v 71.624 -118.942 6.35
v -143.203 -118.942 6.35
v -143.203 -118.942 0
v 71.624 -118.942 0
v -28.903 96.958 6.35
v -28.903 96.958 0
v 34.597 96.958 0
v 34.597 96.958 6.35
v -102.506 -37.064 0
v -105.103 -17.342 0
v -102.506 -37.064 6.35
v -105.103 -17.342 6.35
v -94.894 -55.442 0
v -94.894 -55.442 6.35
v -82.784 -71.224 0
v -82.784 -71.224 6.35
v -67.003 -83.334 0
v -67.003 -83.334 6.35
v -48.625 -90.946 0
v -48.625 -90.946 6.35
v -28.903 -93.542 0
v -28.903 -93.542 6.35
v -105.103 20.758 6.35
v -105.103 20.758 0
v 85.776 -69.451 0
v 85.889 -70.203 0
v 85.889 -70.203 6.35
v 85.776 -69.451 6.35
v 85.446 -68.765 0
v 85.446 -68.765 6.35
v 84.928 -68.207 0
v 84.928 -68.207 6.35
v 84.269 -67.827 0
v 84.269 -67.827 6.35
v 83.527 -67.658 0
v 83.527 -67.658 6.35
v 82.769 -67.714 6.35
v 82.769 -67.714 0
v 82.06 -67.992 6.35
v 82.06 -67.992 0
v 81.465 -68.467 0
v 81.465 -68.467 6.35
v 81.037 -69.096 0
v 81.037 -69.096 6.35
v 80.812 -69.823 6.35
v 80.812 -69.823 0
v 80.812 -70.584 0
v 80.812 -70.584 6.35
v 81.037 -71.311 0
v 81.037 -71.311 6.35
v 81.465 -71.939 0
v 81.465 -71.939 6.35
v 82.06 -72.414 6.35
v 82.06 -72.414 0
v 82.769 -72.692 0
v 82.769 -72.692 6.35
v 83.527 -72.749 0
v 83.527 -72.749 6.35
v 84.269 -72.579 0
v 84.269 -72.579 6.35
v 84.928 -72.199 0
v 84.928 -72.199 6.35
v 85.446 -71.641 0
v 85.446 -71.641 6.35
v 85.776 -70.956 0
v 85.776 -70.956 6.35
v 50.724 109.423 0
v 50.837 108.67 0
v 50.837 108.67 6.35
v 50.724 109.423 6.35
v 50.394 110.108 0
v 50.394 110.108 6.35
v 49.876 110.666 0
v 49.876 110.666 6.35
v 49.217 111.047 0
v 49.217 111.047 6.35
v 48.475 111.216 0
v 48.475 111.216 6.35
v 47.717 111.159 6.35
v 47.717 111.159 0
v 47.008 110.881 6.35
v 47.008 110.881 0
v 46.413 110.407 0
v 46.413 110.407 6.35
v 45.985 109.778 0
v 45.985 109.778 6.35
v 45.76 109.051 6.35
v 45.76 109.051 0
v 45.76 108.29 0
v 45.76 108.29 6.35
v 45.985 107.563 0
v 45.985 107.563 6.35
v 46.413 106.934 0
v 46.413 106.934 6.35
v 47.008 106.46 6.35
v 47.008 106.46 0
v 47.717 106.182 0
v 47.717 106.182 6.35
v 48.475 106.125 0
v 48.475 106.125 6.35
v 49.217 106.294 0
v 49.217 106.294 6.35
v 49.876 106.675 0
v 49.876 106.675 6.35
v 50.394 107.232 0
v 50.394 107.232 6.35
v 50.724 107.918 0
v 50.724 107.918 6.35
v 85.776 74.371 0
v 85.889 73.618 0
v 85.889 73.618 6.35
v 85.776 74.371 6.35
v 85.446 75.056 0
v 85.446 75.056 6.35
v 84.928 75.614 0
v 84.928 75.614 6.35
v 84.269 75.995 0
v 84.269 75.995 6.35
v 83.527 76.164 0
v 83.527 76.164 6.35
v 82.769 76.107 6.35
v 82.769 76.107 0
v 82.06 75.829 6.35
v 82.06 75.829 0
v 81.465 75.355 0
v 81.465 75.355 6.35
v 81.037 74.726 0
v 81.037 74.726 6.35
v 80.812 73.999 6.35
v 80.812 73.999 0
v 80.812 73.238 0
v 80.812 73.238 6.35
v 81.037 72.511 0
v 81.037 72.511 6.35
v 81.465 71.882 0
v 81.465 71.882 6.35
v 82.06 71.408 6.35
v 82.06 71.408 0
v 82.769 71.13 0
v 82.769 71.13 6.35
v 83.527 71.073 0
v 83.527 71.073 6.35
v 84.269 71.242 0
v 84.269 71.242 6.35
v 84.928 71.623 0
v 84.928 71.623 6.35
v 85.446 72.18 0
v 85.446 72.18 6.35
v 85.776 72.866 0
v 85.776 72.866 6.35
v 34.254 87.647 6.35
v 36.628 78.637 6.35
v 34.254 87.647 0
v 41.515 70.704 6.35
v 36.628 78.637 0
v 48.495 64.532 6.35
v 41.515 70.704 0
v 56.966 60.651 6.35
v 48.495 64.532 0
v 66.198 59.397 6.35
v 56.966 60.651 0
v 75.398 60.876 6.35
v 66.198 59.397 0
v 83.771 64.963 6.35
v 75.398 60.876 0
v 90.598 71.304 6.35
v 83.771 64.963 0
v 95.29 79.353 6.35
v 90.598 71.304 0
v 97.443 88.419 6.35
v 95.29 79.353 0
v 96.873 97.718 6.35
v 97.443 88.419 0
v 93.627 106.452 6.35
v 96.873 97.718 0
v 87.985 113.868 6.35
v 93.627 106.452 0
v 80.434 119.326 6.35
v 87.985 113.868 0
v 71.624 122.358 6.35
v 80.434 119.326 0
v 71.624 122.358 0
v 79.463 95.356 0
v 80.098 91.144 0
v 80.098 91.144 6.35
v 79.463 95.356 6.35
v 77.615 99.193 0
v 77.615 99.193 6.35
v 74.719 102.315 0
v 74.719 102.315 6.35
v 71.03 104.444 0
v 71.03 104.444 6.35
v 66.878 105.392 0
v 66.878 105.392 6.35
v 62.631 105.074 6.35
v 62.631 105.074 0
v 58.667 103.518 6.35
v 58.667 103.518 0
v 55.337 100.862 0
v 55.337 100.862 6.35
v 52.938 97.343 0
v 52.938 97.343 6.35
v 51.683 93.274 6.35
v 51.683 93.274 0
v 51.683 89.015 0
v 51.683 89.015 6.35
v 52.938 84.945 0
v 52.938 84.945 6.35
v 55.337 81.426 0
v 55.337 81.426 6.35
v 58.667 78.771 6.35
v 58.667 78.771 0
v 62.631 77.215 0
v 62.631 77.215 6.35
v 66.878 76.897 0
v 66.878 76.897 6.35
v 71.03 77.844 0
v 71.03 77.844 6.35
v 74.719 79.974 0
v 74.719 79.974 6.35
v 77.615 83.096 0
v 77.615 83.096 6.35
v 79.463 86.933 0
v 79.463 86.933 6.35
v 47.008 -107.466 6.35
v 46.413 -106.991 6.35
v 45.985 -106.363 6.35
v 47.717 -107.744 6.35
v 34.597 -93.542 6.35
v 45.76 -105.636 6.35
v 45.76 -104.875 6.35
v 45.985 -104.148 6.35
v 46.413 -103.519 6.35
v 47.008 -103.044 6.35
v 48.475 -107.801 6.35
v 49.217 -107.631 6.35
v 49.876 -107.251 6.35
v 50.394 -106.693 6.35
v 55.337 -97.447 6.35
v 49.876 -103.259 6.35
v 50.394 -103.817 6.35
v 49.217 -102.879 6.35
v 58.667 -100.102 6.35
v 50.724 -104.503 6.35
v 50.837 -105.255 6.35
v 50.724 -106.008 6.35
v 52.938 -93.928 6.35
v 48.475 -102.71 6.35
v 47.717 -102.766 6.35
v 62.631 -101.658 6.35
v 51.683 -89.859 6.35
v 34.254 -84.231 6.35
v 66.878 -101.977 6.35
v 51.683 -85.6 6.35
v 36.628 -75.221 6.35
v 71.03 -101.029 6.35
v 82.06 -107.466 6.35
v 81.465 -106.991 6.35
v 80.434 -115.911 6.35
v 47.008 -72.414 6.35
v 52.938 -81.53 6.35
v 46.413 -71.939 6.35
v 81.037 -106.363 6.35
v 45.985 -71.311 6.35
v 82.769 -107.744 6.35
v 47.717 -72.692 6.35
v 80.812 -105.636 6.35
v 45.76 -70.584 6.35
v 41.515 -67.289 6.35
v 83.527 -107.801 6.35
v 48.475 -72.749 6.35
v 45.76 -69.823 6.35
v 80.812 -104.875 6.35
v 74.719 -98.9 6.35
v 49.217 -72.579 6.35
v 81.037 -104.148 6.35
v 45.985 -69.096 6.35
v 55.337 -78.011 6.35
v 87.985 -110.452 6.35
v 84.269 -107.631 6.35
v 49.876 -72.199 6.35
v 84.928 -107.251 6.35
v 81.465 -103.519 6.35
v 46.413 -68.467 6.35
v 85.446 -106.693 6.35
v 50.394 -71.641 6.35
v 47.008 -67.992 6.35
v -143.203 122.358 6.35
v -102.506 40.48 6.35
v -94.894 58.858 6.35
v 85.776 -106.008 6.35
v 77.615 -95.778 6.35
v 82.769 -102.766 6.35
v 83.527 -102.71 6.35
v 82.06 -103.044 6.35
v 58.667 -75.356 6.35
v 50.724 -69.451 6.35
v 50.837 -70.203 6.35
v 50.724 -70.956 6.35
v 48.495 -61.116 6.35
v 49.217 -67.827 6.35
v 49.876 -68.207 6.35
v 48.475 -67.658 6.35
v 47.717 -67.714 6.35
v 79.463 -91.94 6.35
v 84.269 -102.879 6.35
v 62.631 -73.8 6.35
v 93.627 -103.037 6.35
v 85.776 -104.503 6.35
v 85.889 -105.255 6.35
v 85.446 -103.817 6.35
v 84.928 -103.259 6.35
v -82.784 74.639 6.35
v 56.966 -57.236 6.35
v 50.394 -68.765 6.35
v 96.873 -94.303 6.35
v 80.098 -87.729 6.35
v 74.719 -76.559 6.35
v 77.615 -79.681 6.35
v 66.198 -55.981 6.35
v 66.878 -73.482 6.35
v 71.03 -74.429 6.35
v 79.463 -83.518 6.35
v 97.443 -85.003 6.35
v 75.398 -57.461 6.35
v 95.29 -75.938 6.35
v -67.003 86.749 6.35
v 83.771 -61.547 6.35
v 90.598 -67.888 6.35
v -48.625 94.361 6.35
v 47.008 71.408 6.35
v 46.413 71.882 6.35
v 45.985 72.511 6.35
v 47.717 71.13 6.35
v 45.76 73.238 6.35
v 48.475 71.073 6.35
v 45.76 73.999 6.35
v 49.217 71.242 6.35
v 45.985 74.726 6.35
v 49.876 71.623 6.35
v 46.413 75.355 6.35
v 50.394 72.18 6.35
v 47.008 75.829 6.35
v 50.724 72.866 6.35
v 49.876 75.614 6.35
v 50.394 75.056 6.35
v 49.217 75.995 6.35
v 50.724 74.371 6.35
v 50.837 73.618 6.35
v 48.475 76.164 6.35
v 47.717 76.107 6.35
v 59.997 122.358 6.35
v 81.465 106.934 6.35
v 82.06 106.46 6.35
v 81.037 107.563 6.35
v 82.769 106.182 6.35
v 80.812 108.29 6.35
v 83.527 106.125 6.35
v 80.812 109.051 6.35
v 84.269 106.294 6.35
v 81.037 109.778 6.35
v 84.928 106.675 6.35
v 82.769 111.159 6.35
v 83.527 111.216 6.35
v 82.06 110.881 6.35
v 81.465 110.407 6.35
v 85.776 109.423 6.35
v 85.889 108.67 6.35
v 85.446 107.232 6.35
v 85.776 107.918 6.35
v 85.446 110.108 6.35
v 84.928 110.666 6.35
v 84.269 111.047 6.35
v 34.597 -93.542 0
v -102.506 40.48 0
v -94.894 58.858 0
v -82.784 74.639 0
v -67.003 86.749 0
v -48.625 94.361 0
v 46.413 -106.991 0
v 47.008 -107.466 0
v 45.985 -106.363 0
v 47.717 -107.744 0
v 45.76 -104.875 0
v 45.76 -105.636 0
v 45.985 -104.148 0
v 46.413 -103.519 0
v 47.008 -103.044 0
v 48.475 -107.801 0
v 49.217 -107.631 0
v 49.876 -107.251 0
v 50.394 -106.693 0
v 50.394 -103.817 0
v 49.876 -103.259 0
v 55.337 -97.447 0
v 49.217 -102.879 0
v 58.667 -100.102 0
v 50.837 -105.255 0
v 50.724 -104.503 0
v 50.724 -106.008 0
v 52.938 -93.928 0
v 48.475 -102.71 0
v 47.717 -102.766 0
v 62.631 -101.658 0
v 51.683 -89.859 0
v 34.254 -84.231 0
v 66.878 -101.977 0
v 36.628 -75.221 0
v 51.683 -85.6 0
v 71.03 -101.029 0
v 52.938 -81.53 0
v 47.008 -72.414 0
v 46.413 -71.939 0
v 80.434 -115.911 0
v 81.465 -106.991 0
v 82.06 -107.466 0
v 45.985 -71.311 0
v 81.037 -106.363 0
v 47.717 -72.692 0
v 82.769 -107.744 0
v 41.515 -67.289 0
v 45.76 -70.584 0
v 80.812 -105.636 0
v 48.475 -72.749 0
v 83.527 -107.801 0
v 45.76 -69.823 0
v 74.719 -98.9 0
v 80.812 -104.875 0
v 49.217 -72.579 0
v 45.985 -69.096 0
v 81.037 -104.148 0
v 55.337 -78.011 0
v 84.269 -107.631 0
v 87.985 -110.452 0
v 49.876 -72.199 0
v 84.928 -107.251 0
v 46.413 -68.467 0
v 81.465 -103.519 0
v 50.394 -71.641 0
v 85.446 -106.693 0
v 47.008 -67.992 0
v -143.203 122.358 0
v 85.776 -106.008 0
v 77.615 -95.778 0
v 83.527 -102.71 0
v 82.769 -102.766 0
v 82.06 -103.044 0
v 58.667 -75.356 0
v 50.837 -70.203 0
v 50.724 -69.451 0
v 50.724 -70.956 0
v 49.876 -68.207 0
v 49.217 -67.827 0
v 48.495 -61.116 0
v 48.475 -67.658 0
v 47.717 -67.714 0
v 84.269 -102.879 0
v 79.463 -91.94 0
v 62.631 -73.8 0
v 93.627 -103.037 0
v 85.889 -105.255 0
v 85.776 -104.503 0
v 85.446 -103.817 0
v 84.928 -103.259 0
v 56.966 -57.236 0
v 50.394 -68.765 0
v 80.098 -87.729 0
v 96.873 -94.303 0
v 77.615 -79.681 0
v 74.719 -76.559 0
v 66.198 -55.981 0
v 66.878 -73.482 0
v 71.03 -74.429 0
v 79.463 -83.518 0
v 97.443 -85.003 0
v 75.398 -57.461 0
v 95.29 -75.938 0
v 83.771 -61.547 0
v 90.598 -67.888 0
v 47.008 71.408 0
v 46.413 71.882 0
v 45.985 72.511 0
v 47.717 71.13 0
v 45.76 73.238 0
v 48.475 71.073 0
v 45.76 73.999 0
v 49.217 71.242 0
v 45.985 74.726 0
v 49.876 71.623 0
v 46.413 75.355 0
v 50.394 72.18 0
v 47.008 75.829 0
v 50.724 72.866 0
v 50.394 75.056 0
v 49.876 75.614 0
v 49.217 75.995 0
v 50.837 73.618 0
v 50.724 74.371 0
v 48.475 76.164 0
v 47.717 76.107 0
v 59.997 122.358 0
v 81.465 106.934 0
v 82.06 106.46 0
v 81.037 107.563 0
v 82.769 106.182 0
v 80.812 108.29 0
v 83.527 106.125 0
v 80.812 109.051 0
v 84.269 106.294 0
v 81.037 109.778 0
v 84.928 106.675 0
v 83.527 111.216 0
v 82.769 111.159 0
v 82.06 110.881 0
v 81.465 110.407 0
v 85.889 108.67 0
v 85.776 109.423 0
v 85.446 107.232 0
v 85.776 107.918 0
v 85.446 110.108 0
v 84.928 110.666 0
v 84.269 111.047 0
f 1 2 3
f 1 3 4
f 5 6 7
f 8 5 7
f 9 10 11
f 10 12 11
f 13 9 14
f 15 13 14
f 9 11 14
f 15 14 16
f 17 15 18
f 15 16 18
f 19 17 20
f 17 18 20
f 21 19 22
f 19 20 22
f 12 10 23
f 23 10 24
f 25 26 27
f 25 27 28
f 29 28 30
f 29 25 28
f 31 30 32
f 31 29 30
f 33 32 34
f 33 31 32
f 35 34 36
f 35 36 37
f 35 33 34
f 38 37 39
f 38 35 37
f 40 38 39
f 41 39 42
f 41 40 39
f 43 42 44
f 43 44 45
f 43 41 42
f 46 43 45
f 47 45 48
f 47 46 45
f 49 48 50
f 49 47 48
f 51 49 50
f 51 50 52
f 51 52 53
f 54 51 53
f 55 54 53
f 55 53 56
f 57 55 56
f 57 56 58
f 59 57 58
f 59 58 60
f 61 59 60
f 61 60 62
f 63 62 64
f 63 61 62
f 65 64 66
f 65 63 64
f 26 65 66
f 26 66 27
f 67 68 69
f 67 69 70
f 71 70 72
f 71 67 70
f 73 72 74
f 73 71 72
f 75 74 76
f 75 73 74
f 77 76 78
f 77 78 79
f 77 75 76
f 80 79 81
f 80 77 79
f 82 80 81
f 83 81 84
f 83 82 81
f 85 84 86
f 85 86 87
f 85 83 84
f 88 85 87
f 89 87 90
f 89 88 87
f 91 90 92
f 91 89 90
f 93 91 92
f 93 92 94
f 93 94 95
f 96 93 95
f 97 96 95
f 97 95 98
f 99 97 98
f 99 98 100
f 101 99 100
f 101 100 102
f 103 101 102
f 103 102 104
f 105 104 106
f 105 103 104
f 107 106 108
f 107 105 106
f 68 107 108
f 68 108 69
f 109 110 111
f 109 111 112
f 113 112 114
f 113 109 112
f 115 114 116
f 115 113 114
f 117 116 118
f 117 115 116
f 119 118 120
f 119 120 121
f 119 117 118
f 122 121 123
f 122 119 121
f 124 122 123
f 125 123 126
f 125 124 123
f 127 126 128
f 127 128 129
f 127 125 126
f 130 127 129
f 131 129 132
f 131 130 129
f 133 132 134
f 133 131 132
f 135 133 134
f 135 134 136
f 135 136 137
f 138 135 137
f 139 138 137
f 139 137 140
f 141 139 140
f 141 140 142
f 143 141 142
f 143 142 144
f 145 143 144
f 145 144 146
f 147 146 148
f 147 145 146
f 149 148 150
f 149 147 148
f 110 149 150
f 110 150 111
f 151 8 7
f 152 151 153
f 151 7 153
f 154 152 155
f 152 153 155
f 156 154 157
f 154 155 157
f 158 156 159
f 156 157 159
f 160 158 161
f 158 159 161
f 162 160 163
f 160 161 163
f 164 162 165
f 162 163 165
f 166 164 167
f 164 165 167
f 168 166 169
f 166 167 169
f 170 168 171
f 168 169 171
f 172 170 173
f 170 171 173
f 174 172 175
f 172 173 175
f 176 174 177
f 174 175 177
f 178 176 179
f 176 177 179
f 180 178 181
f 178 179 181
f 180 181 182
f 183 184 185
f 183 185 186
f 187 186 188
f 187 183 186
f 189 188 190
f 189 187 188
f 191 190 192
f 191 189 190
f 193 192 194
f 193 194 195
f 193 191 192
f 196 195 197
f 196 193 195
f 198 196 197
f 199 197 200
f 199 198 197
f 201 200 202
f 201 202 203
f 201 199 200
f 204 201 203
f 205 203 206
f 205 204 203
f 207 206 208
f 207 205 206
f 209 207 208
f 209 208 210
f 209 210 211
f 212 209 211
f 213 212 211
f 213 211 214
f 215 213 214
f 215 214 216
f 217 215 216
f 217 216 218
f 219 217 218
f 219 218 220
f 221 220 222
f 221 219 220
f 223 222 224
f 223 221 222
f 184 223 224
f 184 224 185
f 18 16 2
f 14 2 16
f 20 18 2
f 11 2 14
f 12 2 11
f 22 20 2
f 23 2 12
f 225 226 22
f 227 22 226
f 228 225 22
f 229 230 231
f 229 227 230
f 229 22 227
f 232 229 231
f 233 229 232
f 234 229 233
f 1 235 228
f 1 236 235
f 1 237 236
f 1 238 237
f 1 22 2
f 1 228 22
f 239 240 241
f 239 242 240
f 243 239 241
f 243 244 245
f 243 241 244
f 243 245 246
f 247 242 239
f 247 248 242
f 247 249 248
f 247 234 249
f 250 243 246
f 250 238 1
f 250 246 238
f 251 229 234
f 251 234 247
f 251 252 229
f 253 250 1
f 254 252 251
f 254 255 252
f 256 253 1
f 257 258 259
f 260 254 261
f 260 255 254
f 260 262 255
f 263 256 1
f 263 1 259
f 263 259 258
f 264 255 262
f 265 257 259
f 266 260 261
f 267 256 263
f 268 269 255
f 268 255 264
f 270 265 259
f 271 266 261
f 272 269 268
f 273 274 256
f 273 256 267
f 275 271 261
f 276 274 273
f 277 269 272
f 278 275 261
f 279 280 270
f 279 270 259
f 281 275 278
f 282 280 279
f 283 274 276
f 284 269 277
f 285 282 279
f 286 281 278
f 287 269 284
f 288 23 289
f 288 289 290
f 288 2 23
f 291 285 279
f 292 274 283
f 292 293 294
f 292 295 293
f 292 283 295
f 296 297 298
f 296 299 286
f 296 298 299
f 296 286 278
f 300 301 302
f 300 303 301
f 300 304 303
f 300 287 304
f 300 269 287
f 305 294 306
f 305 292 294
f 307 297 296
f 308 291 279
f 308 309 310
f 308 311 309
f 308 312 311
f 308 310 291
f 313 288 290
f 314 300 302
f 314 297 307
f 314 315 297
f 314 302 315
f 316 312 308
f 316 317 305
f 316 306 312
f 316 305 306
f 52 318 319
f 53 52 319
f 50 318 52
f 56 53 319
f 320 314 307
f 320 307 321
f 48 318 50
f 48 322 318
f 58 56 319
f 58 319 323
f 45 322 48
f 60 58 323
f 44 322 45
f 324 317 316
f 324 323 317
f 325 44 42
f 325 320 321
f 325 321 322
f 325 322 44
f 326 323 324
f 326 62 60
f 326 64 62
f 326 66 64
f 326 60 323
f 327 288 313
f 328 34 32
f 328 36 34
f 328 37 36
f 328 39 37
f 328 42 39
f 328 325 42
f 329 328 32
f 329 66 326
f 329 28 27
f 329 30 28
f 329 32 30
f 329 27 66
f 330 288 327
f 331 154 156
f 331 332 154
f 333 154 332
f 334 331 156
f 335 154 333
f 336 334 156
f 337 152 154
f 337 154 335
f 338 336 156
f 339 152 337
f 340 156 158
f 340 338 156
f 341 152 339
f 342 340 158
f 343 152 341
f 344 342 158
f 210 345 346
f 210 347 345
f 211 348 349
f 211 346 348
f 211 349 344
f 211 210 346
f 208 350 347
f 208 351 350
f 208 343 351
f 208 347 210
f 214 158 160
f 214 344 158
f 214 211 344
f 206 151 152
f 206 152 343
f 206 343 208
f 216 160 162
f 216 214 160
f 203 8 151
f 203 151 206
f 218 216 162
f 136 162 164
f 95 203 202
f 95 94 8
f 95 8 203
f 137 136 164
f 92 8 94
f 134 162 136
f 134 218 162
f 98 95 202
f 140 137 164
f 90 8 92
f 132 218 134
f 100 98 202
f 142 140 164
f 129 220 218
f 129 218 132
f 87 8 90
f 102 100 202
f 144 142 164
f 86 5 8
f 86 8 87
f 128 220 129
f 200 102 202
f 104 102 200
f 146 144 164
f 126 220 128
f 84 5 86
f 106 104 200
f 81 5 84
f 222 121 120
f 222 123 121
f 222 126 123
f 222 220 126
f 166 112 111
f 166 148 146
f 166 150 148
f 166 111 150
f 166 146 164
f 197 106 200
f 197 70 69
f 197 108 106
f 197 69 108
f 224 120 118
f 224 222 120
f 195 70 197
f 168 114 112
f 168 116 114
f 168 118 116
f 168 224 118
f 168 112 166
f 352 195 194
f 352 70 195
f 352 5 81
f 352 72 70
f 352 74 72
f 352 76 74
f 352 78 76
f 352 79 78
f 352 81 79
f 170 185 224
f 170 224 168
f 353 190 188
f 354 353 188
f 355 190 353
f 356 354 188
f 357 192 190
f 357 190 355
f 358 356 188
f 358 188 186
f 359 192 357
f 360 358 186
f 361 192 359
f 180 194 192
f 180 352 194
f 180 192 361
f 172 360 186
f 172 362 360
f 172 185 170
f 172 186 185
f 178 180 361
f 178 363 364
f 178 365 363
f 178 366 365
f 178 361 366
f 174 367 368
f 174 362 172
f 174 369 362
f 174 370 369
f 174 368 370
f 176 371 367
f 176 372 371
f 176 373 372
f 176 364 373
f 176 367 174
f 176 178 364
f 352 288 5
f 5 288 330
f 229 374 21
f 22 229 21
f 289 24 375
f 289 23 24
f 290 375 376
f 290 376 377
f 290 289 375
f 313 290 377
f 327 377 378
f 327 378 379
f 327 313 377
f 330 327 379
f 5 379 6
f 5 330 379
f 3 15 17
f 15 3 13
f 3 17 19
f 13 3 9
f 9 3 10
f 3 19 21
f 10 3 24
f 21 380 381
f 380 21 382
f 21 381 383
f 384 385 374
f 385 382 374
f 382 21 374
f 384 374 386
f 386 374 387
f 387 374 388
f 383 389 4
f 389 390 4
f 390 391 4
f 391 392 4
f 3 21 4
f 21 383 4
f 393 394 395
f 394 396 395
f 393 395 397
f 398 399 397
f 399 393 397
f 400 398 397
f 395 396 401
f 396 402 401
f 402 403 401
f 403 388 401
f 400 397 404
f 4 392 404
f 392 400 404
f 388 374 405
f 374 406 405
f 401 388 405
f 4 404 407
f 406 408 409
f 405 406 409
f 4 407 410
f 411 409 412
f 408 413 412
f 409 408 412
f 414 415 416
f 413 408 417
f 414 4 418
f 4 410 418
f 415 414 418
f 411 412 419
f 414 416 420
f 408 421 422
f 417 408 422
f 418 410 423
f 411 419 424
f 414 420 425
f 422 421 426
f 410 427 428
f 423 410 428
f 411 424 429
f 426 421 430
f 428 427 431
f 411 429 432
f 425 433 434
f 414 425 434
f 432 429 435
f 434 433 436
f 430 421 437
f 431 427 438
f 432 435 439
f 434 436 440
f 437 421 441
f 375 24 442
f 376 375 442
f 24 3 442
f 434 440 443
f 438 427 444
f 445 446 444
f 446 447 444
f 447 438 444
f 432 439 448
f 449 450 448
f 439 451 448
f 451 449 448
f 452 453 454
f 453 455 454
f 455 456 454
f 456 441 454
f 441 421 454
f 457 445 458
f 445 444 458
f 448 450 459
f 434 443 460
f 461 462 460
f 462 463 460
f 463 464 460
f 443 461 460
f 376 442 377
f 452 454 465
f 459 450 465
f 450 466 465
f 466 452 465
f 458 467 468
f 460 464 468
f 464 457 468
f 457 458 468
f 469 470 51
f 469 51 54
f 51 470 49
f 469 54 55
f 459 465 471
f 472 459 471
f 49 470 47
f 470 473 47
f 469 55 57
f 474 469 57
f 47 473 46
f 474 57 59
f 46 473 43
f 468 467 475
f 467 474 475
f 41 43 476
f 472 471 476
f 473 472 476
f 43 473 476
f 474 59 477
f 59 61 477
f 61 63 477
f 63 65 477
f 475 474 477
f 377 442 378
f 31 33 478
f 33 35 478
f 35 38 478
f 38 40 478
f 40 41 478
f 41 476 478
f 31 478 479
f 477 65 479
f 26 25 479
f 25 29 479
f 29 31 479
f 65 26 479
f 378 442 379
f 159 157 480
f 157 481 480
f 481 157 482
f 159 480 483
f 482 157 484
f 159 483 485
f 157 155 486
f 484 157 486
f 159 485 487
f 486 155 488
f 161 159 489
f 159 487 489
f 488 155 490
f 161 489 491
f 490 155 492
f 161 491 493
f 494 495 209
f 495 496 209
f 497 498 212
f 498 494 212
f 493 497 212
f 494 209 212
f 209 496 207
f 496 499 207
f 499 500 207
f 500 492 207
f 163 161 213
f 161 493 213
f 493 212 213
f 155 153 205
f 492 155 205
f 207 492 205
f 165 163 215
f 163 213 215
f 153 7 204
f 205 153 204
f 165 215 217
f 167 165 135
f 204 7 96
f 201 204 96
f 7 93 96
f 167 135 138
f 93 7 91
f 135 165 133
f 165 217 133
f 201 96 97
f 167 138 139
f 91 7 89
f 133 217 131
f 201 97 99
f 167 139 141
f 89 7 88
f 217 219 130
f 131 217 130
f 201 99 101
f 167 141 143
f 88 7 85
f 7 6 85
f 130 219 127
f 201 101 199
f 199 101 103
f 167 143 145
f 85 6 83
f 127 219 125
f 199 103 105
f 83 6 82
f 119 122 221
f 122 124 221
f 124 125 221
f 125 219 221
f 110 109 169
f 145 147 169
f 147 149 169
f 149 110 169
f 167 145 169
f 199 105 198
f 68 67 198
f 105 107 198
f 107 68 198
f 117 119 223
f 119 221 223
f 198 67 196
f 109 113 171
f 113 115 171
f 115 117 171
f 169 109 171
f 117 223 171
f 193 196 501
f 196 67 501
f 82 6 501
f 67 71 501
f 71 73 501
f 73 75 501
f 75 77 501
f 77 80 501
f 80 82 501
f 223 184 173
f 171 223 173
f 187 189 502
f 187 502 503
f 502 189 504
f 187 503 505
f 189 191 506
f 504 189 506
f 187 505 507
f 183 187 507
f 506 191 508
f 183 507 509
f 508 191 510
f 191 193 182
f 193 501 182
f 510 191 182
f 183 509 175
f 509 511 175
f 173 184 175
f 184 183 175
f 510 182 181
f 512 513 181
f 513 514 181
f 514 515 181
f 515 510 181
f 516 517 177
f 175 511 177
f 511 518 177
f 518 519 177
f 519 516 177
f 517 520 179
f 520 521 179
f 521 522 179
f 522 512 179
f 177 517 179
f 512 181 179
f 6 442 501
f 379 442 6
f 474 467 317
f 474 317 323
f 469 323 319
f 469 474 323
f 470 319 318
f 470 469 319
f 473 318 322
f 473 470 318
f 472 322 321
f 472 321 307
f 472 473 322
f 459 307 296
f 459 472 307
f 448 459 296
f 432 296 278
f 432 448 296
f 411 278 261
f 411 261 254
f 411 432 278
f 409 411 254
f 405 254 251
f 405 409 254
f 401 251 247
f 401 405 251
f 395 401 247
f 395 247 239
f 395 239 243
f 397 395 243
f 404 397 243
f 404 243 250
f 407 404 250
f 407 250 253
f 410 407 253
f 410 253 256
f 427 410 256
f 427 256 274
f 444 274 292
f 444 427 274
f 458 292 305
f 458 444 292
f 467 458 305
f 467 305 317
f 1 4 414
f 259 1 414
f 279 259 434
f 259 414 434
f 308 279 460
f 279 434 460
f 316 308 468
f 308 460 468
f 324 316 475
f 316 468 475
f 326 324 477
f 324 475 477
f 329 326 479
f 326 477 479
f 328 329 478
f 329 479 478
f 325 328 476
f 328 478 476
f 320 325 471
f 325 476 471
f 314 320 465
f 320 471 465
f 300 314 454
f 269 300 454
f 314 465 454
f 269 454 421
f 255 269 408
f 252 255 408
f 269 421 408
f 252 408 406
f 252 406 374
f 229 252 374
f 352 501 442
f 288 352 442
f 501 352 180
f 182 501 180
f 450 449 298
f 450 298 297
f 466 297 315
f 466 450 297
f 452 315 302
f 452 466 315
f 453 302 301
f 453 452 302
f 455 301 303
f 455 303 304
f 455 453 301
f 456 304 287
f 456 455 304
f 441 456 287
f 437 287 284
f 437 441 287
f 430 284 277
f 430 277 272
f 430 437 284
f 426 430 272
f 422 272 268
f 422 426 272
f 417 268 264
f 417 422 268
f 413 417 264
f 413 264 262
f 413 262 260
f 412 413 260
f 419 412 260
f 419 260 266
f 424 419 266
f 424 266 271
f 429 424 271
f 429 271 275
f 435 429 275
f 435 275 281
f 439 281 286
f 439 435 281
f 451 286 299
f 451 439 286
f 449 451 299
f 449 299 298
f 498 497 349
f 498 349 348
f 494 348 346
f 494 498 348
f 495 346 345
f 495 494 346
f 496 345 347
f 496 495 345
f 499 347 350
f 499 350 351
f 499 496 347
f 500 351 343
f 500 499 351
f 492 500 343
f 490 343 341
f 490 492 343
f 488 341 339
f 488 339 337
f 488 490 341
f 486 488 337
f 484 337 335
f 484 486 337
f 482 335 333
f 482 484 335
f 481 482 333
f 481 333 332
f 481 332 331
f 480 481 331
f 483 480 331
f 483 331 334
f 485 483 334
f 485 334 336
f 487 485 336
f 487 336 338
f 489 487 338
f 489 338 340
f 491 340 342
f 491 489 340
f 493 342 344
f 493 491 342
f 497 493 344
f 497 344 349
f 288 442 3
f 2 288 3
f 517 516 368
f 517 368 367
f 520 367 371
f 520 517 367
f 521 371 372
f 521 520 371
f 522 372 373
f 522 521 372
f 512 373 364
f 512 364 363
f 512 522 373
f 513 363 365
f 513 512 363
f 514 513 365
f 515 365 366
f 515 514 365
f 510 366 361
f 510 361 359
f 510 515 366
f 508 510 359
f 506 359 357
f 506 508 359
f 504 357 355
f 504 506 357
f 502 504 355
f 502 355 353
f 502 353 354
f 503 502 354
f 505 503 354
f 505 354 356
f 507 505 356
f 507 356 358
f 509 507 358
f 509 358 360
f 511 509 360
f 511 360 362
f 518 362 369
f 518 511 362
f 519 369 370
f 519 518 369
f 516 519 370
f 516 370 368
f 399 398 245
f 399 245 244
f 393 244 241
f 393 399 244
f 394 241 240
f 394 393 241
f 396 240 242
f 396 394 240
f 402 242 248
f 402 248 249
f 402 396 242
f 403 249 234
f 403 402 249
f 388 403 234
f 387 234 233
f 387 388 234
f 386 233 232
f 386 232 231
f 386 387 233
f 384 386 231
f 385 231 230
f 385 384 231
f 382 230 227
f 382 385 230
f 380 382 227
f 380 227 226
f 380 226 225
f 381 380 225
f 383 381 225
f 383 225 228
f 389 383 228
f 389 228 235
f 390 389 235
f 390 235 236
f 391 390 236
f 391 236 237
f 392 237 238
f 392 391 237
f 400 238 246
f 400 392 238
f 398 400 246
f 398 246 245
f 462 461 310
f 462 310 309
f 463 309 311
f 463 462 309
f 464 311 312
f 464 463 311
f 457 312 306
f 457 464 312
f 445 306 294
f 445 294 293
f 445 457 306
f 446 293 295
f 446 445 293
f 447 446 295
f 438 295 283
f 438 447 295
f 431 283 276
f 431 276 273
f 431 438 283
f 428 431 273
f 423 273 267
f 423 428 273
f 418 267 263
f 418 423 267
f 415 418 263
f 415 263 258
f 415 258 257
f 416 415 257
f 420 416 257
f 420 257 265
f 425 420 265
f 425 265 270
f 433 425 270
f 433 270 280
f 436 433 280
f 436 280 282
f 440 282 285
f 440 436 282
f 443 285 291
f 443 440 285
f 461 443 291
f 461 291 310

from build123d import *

# Parameters (mm, degrees)
F0_R     = 2.5527
F0_R_2   = 14.2875
F1_DEPTH = 6.35
F2_R     = 76.2
F3_R     = 76.2
F4_W     = 30.394944
F4_H     = 7.431119
F4_W_2   = 30.836145
F4_H_2   = 7.137986
F5_DEPTH = 25.4


with BuildPart() as f1:
    # F0 (on Top) → F1 (new body)
    with BuildSketch(Plane.XY):
        with BuildLine():
            Line((-143.202675, -118.942378), (59.997325, -118.942378))
            ThreePointArc((59.997325, -118.942378), (88.261238, -65.278465), (34.597325, -93.542378))
            Line((34.597325, -93.542378), (-105.102675, -93.542378))
            Line((-105.102675, -93.542378), (-105.102675, 96.957622))
            Line((-105.102675, 96.957622), (34.597325, 96.957622))
            ThreePointArc((34.597325, 96.957622), (88.261238, 68.69371), (59.997325, 122.357622))
            Line((59.997325, 122.357622), (-143.202675, 122.357622))
            Line((-143.202675, 122.357622), (-143.202675, -118.942378))
        make_face()
        with Locations((48.284597, -105.255106)):
            Circle(F0_R, mode=Mode.SUBTRACT)
        with Locations((83.336597, -105.255106)):
            Circle(F0_R, mode=Mode.SUBTRACT)
        with Locations((65.810597, -87.729106)):
            Circle(F0_R_2, mode=Mode.SUBTRACT)
        with Locations((48.284597, -70.203106)):
            Circle(F0_R, mode=Mode.SUBTRACT)
        with Locations((83.336597, -70.203106)):
            Circle(F0_R, mode=Mode.SUBTRACT)
        with Locations((48.284597, 73.61835)):
            Circle(F0_R, mode=Mode.SUBTRACT)
        with Locations((65.810597, 91.14435)):
            Circle(F0_R_2, mode=Mode.SUBTRACT)
        with Locations((83.336597, 73.61835)):
            Circle(F0_R, mode=Mode.SUBTRACT)
        with Locations((48.284597, 108.67035)):
            Circle(F0_R, mode=Mode.SUBTRACT)
        with Locations((83.336597, 108.67035)):
            Circle(F0_R, mode=Mode.SUBTRACT)
    extrude(amount=F1_DEPTH)

    # F2
    f2_edges = [f1.edges().sort_by_distance(p)[0] for p in [
        (-105.102675, 96.957622, 3.175),
    ]]
    fillet(f2_edges, radius=F2_R)

    # F3
    f3_edges = [f1.edges().sort_by_distance(p)[0] for p in [
        (-105.102675, -93.542378, 3.175),
    ]]
    fillet(f3_edges, radius=F3_R)

    # F4 (on face) → F5 (cut)
    with BuildSketch(Plane.XY.offset(6.35)):
        with Locations((75.194797, 126.073181)):
            Rectangle(F4_W, F4_H)
        with Locations((75.415397, -122.511371)):
            Rectangle(F4_W_2, F4_H_2)
    extrude(amount=-F5_DEPTH, mode=Mode.SUBTRACT)


solid = f1.part
